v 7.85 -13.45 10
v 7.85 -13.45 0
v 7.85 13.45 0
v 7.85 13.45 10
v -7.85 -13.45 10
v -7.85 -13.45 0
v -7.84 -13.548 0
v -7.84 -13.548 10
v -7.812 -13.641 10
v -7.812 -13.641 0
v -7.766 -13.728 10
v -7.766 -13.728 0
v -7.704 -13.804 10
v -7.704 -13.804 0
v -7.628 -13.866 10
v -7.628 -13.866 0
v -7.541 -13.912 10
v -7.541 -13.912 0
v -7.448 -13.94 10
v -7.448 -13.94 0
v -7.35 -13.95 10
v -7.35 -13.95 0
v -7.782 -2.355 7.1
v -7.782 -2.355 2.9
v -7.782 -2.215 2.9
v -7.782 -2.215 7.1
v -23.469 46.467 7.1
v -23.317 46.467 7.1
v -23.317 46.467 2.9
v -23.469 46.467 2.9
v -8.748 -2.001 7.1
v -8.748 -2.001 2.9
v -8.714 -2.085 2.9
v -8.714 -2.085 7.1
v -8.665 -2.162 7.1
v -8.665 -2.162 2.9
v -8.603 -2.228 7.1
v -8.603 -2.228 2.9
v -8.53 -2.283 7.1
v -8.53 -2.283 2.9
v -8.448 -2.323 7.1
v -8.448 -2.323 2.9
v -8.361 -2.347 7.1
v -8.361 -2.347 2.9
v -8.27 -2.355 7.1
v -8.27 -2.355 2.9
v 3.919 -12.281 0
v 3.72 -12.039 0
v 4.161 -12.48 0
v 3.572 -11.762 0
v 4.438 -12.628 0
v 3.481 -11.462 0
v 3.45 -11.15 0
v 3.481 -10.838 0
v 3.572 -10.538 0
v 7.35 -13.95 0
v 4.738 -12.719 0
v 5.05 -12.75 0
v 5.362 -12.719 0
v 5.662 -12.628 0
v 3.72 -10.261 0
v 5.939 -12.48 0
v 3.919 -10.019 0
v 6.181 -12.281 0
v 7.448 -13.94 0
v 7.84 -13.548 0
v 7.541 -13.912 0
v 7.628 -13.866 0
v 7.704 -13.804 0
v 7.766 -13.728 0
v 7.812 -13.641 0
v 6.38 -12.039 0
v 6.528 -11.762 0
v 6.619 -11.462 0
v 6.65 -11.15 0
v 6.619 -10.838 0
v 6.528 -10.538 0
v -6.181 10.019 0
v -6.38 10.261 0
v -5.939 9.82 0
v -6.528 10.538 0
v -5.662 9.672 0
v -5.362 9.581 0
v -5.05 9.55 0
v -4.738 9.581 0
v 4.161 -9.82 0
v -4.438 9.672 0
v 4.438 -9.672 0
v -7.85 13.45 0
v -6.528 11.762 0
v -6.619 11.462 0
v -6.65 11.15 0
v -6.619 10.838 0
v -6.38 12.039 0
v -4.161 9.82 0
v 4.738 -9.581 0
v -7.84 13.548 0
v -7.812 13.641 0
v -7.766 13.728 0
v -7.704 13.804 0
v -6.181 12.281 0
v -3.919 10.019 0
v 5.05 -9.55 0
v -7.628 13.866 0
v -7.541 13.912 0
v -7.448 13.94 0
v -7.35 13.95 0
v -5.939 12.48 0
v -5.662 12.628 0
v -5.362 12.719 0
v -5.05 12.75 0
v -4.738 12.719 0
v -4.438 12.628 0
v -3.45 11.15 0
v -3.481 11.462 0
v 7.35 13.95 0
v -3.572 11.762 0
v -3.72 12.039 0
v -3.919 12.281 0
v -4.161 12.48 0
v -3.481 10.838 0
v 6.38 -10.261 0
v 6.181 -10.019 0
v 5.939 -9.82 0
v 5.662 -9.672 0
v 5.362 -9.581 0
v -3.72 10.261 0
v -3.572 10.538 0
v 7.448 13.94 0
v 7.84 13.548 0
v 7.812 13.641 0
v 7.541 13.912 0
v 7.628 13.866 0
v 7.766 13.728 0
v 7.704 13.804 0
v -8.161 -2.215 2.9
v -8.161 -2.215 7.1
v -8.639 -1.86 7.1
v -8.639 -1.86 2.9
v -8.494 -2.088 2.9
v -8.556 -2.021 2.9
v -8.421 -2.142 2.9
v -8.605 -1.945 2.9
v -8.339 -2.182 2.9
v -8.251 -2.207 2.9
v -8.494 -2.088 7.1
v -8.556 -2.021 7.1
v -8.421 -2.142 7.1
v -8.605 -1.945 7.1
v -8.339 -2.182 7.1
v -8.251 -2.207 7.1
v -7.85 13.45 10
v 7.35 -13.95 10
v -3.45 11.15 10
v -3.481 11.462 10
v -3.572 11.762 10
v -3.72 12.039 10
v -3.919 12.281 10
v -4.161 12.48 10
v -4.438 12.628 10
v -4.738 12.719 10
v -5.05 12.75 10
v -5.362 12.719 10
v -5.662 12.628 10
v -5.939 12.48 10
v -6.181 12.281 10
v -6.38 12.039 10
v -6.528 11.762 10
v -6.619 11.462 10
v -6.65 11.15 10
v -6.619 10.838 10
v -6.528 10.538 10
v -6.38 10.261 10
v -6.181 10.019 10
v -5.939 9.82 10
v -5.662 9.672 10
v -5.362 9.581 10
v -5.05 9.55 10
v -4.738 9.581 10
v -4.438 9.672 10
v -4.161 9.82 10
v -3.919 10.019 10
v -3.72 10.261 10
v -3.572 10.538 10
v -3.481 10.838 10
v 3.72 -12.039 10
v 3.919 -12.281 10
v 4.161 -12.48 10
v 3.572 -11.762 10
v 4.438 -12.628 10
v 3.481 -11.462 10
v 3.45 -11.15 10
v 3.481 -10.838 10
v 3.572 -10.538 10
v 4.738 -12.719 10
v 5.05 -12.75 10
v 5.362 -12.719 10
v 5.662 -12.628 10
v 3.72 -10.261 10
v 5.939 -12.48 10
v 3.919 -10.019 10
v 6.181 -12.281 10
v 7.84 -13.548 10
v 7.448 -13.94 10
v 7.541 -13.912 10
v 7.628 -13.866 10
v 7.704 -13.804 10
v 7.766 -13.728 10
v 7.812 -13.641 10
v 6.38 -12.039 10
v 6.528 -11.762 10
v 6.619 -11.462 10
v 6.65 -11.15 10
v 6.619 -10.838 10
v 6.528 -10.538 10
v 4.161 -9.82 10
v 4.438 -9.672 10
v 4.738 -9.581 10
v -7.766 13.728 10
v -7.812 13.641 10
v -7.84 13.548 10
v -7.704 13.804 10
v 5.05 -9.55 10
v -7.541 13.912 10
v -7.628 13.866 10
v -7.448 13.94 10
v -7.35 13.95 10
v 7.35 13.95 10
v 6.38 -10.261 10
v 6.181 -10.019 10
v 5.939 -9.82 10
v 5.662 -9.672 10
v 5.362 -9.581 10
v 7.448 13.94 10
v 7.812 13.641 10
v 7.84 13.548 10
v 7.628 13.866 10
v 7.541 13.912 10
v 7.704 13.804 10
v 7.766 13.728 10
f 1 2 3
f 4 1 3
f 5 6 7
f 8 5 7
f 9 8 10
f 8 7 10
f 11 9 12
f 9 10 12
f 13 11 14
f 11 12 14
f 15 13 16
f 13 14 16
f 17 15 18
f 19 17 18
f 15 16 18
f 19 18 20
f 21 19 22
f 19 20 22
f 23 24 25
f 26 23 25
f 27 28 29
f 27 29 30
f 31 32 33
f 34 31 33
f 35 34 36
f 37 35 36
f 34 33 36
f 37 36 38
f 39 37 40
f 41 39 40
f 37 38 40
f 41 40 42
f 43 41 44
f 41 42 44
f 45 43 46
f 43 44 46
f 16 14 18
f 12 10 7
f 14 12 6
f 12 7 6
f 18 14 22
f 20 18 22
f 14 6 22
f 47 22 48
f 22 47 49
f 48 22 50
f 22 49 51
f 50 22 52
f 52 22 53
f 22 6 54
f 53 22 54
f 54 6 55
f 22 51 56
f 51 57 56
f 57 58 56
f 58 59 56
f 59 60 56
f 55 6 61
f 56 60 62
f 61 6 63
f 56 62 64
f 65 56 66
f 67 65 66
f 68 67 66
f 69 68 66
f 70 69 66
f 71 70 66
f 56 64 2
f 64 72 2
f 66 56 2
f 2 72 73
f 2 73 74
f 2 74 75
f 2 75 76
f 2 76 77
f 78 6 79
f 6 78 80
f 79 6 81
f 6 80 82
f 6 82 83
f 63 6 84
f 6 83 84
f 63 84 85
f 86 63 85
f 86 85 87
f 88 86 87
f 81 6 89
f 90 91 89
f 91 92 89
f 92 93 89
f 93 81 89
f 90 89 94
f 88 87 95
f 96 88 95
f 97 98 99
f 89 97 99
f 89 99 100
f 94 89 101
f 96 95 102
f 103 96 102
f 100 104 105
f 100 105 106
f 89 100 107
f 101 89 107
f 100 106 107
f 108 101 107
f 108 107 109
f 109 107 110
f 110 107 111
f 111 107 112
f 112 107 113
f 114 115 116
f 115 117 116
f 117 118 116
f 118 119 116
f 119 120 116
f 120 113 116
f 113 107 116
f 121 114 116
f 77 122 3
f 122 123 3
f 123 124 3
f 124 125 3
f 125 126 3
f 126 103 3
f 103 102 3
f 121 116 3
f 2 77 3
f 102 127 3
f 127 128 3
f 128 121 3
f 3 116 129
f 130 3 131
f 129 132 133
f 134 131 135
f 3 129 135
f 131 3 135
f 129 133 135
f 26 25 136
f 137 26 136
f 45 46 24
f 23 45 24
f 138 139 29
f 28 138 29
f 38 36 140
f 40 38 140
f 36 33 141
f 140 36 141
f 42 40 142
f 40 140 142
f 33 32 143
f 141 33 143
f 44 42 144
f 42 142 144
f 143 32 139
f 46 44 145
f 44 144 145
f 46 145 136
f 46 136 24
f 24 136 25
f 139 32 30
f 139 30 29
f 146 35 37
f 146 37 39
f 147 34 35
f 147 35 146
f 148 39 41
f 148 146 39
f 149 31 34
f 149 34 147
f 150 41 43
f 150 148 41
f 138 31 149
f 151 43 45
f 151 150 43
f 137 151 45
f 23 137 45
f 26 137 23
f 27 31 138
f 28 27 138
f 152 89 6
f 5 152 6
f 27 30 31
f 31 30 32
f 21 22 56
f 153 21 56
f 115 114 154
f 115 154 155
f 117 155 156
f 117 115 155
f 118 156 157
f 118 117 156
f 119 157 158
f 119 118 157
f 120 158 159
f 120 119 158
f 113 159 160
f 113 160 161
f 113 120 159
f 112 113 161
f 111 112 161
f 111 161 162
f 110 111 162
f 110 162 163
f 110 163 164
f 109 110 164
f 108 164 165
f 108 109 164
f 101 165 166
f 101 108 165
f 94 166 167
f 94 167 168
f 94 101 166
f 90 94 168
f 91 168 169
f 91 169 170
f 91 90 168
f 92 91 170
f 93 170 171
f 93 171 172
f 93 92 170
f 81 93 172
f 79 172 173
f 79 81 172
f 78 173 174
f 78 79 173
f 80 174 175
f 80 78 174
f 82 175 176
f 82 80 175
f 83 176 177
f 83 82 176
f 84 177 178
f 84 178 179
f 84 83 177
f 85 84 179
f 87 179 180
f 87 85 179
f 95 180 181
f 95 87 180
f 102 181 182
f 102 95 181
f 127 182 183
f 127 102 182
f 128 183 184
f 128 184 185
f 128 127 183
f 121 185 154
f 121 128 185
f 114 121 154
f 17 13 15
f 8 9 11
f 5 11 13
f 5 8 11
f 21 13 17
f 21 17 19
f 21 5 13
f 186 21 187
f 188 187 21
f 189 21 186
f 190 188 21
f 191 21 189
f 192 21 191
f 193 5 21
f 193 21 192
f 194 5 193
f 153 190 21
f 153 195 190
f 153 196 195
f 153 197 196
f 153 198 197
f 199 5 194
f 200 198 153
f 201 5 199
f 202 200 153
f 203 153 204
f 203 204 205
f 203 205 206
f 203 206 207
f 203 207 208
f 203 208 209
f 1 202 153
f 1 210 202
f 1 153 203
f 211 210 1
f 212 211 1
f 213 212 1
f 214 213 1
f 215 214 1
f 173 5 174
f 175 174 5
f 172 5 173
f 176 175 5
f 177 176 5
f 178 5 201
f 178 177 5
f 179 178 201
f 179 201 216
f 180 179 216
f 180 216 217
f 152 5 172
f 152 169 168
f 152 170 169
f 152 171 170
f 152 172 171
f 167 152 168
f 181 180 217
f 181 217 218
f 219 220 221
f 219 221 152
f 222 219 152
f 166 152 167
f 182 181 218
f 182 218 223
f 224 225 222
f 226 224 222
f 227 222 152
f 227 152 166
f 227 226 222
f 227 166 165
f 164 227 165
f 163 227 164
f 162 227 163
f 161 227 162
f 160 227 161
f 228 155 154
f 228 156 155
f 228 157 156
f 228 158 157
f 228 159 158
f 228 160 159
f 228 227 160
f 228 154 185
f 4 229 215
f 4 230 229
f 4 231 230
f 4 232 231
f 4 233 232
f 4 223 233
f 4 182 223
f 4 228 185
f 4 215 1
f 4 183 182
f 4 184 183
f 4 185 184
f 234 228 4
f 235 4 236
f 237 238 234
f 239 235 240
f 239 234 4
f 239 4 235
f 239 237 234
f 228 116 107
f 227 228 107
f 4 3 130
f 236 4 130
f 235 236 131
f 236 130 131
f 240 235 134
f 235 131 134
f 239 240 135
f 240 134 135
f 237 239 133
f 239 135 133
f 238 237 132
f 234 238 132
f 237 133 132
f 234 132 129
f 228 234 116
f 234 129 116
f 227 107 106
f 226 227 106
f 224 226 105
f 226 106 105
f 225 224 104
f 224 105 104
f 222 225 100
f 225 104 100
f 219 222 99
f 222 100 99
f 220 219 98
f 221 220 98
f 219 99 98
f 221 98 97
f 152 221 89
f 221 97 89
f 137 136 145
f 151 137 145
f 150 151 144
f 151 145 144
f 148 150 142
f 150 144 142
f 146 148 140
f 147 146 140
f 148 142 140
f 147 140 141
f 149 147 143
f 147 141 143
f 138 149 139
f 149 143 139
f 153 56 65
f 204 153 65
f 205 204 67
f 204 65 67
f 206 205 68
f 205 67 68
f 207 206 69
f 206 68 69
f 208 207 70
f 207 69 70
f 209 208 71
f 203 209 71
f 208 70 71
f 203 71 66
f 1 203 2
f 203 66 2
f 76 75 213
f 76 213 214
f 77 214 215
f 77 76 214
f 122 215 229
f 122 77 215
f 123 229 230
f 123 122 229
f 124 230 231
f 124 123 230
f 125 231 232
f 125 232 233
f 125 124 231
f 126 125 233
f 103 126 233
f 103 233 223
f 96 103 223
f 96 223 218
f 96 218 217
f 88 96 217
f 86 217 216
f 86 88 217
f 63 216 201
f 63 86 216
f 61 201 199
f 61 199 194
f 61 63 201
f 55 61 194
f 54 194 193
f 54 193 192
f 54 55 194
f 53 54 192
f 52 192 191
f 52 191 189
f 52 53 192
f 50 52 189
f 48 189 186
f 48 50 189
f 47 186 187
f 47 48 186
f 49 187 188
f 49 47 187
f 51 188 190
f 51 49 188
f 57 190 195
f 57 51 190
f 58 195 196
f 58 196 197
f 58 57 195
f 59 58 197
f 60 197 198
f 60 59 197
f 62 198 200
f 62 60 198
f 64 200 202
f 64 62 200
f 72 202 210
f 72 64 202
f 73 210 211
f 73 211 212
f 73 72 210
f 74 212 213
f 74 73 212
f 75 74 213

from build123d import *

# Parameters (mm, degrees)
F0_R     = 1.6
F1_DEPTH = 10
F4_DEPTH = 4.2


with BuildPart() as f1:
    # F0 (on Top) → F1 (new body)
    with BuildSketch(Plane.XY):
        with BuildLine():
            Line((-5.05, 13.95), (-7.35, 13.95))
            ThreePointArc((-7.35, 13.95), (-7.7035533906, 13.8035533906), (-7.85, 13.45))
            Line((-7.85, 13.45), (-7.85, -2.05))
            Line((-7.85, -2.05), (7.85, -2.05))
            Line((7.85, -2.05), (7.85, 13.45))
            ThreePointArc((7.85, 13.45), (7.7035533906, 13.8035533906), (7.35, 13.95))
            Line((7.35, 13.95), (-5.05, 13.95))
        make_face()
        with Locations((-5.05, 11.15)):
            Circle(F0_R, mode=Mode.SUBTRACT)
        with BuildLine():
            Line((7.85, -2.05), (-7.85, -2.05))
            Line((-7.85, -2.05), (-7.85, -13.45))
            ThreePointArc((-7.85, -13.45), (-7.7035533906, -13.8035533906), (-7.35, -13.95))
            Line((-7.35, -13.95), (5.05, -13.95))
            Line((5.05, -13.95), (7.35, -13.95))
            ThreePointArc((7.35, -13.95), (7.7035533906, -13.8035533906), (7.85, -13.45))
            Line((7.85, -13.45), (7.85, -11.15))
            Line((7.85, -11.15), (7.85, -2.05))
        make_face()
        with Locations((5.05, -11.15)):
            Circle(F0_R, mode=Mode.SUBTRACT)
    extrude(amount=F1_DEPTH)


with BuildPart() as f4:
    # F3 (on offset) → F4 (new body)
    with BuildSketch(Plane.XY.offset(2.9)):
        with BuildLine():
            Line((-7.7815089673, -2.355466623), (-7.7815089673, -2.2150006499))
            Line((-7.7815089673, -2.2150006499), (-8.1608147489, -2.2150006499))
            ThreePointArc((-8.1608147489, -2.2150006499), (-8.458596478, -2.116654782), (-8.6392357967, -1.8603048171))
            Line((-8.6392357967, -1.8603048171), (-23.3169193168, 46.4666830646))
            Line((-23.3169193168, 46.4666830646), (-23.4687773589, 46.4666830646))
            Line((-23.4687773588, 46.4666830646), (-8.7484320635, -2.0007707902))
            ThreePointArc((-8.7484320635, -2.0007707902), (-8.5677927448, -2.2571207551), (-8.2700110157, -2.355466623))
            Line((-8.2700110157, -2.355466623), (-7.7815089673, -2.355466623))
        make_face()
    extrude(amount=F4_DEPTH)


with BuildPart() as f4b:
    # F3 (on offset) → F4, piece 2 (new body)
    with BuildSketch(Plane.XY.offset(2.9)):
        with BuildLine():
            Line((-7.7815089673, -1.8303291872), (-7.7815089673, -1.2152291602))
            ThreePointArc((-7.7815089673, -1.2152291602), (-8.3503129715, -1.5227791737), (-7.7815089673, -1.8303291872))
        make_face()
    extrude(amount=F4_DEPTH)


solid = Compound([f1.part, f4.part])
